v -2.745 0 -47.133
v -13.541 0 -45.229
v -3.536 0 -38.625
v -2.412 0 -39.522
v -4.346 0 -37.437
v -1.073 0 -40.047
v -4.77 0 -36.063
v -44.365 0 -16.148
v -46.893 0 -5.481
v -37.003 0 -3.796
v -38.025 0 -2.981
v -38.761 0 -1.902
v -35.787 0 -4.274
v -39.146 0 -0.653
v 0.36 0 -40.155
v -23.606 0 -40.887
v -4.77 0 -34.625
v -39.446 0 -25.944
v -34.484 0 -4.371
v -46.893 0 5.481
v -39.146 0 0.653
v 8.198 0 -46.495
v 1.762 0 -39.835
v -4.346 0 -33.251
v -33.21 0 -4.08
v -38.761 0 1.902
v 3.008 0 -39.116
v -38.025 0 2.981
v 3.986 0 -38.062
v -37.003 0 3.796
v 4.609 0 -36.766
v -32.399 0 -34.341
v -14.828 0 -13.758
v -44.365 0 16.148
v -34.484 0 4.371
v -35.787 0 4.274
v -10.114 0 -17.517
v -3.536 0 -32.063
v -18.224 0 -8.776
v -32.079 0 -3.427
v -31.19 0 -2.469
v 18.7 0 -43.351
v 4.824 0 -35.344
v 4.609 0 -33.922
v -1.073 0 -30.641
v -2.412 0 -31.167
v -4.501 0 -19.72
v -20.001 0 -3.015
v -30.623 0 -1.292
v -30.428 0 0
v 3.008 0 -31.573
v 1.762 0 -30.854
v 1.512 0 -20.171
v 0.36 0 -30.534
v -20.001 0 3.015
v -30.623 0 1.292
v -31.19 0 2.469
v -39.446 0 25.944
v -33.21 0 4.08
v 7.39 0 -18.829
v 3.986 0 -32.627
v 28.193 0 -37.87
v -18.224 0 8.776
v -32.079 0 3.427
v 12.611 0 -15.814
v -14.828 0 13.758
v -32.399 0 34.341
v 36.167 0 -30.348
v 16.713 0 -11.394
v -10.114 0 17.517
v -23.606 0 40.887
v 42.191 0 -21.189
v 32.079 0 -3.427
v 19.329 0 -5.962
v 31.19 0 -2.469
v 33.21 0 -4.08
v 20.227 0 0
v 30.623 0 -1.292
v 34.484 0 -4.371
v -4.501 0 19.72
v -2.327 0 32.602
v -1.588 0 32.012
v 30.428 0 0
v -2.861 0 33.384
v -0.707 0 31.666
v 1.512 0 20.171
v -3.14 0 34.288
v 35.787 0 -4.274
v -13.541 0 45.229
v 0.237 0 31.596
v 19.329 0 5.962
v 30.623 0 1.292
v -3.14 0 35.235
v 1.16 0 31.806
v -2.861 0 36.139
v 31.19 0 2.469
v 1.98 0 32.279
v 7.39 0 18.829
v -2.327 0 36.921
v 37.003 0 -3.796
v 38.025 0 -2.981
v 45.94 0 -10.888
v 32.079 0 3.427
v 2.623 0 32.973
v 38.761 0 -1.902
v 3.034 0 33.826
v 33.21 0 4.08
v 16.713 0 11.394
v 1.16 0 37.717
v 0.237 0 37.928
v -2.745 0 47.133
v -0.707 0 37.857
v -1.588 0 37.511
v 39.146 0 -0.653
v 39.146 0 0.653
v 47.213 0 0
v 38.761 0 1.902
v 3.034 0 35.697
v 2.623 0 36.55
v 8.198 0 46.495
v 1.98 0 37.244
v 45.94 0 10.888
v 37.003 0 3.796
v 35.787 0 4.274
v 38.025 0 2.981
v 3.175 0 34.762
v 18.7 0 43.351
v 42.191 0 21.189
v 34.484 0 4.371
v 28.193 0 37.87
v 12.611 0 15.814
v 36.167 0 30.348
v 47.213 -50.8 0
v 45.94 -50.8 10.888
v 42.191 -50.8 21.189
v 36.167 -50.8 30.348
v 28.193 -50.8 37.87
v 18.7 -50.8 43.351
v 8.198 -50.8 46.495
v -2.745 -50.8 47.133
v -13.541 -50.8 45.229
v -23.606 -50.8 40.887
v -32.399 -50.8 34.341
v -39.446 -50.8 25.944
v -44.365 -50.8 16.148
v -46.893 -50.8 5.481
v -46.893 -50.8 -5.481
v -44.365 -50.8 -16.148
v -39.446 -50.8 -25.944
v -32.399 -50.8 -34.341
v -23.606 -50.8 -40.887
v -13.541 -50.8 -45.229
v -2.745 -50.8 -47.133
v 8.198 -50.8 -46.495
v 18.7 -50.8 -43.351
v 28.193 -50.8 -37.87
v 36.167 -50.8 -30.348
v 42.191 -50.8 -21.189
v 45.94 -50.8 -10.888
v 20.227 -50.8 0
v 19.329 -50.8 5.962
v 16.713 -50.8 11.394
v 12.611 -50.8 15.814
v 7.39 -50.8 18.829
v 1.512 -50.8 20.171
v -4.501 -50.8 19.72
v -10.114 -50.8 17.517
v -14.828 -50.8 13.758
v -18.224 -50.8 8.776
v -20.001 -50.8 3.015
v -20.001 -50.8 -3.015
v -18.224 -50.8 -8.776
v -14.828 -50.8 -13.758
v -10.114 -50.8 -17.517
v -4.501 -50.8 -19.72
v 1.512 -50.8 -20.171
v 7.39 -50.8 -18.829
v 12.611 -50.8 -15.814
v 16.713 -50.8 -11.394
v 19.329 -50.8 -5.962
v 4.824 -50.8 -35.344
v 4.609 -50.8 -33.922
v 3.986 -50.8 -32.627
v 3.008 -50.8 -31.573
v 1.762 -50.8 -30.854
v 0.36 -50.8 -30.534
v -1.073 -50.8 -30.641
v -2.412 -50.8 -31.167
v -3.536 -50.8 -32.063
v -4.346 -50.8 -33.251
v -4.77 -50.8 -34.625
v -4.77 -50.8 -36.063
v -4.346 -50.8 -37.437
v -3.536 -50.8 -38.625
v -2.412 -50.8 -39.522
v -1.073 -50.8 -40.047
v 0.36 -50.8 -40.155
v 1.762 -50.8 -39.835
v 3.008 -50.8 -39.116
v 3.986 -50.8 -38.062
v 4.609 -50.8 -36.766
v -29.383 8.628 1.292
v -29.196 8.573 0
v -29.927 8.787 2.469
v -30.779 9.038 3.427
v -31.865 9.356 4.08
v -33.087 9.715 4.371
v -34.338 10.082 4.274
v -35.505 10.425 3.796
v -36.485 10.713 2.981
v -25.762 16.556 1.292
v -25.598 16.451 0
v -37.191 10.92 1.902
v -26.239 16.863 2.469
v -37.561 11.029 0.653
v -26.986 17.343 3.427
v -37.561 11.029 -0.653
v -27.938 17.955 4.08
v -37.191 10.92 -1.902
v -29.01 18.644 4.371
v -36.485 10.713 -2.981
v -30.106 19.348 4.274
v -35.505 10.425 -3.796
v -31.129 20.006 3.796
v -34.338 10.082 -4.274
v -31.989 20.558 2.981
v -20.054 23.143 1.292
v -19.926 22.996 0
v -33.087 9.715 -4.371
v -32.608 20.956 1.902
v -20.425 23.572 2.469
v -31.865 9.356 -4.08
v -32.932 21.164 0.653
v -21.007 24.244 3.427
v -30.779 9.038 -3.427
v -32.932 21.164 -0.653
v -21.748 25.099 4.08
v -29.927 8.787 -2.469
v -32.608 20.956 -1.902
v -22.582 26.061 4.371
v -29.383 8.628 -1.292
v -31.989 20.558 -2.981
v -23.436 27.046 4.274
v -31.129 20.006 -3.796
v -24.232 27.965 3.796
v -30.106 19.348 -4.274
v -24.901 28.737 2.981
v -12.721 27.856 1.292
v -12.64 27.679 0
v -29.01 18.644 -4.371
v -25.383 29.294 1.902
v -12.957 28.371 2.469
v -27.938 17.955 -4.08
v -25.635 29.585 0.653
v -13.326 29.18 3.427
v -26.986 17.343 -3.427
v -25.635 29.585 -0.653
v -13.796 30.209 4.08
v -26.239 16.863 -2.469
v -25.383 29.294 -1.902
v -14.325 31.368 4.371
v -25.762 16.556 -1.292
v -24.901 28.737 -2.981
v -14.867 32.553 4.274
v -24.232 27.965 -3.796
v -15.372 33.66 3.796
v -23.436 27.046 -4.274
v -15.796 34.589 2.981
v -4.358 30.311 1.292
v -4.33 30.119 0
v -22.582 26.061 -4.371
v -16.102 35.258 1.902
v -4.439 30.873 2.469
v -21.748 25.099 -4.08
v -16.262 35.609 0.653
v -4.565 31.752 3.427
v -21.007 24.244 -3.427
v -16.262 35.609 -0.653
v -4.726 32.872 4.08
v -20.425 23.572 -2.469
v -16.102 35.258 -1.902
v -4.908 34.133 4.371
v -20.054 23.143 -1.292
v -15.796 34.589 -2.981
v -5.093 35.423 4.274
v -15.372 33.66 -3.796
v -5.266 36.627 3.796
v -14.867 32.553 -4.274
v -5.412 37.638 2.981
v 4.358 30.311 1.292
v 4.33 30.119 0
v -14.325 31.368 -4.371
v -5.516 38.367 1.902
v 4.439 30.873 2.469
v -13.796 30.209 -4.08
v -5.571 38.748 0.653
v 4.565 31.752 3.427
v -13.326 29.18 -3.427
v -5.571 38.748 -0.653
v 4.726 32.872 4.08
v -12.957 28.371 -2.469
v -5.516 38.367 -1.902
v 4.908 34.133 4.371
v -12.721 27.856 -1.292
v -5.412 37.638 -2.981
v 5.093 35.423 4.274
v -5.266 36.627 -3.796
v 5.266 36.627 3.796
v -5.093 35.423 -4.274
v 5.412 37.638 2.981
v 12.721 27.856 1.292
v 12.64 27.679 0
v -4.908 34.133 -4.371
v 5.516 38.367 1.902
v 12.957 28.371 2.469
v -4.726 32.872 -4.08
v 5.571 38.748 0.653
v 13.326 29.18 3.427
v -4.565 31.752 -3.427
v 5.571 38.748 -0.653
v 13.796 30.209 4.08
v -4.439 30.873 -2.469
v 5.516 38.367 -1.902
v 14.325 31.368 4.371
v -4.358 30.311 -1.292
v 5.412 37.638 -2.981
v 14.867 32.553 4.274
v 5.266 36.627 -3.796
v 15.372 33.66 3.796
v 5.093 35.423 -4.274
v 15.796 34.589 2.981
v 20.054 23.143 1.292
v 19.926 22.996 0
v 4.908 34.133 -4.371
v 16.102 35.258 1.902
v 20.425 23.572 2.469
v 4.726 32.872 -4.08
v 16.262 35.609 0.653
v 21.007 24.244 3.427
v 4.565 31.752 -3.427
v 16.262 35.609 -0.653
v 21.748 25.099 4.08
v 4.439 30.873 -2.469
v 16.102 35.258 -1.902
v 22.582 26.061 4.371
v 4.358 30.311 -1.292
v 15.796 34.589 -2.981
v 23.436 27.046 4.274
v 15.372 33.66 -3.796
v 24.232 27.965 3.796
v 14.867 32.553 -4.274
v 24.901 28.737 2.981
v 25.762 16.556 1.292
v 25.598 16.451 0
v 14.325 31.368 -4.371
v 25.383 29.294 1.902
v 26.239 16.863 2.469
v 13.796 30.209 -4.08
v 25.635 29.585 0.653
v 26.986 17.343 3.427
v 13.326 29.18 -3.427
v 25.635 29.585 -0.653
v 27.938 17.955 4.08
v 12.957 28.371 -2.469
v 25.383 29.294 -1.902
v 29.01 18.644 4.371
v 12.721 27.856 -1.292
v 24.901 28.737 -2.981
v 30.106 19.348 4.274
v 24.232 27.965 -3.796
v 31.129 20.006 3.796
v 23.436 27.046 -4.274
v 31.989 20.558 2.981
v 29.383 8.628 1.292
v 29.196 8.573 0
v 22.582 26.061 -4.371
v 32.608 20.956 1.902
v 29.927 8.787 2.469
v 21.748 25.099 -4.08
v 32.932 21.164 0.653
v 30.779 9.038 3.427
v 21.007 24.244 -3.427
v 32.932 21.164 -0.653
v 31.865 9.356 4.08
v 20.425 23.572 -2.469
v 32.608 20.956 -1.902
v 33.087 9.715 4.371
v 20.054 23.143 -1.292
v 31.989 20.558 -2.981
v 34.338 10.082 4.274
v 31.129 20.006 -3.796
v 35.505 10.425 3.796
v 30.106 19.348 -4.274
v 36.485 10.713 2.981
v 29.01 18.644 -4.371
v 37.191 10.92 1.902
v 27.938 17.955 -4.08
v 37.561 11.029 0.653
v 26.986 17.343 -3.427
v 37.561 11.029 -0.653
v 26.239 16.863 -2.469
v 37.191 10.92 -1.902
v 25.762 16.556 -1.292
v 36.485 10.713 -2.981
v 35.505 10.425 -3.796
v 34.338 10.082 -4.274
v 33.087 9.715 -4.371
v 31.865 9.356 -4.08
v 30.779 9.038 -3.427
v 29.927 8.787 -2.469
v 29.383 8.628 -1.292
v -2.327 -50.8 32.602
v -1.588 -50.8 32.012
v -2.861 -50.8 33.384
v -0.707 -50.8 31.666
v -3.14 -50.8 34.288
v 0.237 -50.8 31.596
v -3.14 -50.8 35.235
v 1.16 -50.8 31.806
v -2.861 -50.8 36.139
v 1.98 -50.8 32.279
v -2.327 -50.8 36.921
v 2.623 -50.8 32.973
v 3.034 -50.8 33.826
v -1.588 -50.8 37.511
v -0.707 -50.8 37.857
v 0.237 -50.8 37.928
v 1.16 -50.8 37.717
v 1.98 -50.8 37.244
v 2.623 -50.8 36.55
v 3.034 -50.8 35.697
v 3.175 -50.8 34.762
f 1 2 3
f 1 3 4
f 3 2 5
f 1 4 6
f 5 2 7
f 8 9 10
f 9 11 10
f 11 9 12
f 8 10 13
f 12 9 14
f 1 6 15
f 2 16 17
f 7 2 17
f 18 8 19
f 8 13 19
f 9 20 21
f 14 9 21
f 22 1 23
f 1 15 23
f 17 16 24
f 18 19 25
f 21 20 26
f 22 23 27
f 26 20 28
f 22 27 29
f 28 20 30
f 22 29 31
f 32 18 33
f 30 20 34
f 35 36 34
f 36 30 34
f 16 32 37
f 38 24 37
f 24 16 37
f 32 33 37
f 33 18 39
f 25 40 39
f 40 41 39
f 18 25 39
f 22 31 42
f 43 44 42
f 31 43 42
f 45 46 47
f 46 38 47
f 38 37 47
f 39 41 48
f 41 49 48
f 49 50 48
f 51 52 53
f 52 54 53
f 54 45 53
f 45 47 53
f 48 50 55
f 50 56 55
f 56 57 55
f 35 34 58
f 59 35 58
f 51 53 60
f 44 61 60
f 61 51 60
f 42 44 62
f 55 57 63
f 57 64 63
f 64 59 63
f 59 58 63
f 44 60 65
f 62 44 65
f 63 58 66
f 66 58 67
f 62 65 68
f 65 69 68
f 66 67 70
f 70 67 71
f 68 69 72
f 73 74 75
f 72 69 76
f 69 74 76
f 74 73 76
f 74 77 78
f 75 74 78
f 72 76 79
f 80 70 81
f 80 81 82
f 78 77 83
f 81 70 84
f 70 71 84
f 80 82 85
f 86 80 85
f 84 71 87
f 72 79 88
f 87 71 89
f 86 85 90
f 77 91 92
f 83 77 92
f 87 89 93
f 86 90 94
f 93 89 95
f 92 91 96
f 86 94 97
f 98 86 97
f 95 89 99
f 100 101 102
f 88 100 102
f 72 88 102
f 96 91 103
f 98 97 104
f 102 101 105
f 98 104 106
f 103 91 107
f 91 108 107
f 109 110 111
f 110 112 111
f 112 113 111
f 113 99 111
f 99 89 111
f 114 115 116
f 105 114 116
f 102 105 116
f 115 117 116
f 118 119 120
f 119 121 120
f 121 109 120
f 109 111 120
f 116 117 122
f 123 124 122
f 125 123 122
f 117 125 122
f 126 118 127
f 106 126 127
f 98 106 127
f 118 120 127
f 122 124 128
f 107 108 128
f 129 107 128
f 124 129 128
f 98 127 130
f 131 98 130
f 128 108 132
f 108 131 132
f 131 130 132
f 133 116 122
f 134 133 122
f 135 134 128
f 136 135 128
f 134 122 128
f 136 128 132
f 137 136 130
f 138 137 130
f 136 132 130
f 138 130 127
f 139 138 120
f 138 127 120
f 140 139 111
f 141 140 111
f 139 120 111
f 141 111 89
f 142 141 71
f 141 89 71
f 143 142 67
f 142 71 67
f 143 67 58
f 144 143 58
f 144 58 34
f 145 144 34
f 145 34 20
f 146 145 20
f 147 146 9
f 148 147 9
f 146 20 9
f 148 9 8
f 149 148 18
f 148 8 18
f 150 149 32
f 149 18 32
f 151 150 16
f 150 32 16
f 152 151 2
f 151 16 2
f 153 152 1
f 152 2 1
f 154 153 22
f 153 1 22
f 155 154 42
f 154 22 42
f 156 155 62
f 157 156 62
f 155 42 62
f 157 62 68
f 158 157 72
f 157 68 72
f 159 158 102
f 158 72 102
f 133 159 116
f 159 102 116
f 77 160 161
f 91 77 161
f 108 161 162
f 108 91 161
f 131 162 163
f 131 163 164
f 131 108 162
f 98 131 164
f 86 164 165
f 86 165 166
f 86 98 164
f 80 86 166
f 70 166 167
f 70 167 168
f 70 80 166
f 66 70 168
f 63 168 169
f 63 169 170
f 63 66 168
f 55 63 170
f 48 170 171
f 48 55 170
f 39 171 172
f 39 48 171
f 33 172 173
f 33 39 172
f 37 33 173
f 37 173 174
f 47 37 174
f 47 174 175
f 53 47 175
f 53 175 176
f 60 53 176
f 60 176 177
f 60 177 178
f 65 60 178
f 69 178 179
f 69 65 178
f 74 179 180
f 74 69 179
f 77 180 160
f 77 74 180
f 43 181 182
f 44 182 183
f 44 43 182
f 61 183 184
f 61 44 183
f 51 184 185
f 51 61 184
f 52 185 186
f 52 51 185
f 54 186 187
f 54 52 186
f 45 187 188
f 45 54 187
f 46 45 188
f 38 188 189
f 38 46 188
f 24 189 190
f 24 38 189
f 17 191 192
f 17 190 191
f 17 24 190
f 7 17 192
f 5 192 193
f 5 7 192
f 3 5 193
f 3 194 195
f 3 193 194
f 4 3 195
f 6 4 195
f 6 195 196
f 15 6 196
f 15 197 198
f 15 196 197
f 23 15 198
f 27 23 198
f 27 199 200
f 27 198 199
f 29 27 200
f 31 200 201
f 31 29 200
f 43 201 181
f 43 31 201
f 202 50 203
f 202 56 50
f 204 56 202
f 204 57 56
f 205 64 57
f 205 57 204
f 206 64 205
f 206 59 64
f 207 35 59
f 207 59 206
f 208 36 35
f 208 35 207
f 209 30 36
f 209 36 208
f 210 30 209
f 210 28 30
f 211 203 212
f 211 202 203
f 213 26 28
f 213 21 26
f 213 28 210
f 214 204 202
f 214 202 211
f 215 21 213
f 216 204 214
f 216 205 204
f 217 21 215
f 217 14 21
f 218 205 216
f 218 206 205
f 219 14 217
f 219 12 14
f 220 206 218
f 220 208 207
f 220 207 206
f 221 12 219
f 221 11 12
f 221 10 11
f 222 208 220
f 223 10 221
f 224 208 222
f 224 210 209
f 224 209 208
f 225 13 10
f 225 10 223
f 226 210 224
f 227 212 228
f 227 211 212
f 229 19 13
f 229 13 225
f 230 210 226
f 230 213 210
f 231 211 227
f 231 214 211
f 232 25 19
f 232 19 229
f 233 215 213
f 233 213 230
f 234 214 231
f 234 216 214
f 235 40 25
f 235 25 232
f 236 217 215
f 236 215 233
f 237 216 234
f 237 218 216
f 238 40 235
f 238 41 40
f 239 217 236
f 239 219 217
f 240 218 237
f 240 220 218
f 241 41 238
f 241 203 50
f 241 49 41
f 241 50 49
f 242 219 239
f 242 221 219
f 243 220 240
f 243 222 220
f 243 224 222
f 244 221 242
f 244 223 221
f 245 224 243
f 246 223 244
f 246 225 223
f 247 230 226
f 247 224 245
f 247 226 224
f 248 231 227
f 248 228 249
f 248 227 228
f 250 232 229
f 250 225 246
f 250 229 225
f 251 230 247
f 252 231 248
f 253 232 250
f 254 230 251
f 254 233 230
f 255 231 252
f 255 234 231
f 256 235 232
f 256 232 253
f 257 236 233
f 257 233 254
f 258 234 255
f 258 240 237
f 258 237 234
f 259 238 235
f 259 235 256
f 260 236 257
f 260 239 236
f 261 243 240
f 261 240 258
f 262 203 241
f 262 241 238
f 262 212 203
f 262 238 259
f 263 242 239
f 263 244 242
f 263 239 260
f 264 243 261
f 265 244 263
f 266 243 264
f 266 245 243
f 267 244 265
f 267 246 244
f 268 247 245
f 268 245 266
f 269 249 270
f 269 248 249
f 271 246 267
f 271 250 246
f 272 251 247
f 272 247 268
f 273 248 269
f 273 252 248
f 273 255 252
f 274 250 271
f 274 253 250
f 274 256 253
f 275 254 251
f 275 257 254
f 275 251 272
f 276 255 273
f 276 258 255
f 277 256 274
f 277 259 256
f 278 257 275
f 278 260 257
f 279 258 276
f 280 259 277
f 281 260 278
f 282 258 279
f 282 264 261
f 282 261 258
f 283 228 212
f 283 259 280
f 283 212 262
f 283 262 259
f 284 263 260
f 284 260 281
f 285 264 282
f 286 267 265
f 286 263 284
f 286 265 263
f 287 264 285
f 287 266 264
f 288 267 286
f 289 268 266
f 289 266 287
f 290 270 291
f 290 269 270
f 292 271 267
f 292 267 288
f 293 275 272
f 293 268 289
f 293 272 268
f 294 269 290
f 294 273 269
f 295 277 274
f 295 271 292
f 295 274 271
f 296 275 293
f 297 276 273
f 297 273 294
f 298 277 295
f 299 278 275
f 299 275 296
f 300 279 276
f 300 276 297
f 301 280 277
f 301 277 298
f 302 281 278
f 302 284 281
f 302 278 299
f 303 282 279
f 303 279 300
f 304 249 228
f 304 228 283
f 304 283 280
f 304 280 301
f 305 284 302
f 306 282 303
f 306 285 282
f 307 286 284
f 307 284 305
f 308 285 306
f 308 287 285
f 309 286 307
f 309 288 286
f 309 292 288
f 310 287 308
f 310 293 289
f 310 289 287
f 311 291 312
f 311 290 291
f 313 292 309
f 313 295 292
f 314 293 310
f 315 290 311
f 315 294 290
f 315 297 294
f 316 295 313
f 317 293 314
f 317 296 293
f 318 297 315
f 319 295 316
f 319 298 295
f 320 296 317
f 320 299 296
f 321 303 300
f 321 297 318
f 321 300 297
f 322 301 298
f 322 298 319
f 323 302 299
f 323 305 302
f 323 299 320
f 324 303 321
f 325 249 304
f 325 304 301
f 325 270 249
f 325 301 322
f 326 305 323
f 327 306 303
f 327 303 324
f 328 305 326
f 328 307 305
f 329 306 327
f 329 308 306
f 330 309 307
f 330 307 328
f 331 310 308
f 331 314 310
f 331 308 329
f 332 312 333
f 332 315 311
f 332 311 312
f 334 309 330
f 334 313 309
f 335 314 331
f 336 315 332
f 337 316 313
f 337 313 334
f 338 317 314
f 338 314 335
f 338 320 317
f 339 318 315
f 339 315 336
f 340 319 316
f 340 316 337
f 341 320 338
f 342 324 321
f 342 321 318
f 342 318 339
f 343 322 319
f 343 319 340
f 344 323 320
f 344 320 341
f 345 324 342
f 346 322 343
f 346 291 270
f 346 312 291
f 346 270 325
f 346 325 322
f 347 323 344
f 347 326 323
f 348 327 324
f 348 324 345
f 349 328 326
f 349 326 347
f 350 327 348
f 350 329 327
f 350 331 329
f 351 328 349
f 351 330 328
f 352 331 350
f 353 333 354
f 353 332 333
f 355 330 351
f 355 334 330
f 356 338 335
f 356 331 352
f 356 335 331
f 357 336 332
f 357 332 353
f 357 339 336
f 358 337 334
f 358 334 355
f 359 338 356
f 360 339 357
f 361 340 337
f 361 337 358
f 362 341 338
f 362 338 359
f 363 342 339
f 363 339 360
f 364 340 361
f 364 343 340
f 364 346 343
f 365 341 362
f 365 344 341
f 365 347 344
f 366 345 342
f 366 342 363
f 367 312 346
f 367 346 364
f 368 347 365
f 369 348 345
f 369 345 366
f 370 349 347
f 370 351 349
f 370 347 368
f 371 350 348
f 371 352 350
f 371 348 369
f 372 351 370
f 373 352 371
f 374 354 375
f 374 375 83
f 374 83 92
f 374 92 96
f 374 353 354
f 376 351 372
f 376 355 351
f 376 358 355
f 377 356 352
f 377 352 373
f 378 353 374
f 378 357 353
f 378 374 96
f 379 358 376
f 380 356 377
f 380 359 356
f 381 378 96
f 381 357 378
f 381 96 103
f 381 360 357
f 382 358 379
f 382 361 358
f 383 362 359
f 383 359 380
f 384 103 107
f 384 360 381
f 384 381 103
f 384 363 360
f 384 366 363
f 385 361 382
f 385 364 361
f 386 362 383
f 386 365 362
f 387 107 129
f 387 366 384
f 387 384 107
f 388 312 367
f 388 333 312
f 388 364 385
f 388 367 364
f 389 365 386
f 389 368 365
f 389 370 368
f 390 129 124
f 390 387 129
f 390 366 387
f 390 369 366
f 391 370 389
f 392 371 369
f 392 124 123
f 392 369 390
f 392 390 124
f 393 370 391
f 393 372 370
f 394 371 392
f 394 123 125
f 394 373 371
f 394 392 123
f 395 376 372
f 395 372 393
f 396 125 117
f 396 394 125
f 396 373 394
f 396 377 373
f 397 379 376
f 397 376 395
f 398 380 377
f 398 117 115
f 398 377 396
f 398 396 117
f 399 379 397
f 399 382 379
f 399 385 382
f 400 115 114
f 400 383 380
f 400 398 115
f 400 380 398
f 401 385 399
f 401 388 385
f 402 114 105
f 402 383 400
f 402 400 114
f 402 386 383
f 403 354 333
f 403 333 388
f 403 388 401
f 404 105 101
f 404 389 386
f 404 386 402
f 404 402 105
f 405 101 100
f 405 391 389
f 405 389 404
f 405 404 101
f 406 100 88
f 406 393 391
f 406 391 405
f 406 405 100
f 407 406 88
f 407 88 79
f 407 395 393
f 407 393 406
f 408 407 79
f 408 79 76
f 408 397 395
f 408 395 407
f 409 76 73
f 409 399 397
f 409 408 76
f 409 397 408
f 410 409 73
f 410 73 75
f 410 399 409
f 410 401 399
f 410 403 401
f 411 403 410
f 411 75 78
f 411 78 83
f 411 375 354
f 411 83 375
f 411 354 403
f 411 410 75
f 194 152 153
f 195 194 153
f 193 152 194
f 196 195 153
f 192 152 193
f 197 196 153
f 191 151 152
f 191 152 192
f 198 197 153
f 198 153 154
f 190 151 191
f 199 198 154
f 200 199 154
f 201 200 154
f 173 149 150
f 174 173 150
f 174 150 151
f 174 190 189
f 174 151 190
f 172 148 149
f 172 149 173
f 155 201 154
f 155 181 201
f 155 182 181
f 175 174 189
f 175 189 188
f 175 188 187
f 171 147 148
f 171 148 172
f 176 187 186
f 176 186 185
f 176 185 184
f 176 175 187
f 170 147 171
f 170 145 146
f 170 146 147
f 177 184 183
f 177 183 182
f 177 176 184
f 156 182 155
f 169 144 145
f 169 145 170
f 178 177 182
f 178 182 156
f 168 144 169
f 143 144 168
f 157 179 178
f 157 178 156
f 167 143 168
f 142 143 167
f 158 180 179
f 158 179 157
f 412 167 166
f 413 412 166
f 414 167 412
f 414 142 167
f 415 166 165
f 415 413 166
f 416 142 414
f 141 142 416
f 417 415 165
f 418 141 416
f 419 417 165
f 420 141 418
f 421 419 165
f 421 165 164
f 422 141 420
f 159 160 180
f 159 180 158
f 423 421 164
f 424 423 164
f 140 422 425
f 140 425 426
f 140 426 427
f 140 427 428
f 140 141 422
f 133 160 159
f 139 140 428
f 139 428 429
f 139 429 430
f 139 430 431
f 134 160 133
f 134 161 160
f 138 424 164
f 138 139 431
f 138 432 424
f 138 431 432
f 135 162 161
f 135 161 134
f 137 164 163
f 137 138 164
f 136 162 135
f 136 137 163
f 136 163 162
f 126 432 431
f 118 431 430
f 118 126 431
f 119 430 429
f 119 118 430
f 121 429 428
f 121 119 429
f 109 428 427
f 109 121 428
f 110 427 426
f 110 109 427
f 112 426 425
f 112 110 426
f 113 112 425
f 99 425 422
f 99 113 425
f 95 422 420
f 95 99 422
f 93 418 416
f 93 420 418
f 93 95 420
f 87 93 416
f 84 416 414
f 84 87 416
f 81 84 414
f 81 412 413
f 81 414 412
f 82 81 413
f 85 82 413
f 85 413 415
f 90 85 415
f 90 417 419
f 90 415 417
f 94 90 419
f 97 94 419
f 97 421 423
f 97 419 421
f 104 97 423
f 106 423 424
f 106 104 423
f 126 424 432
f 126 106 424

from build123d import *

# Parameters (mm, degrees)
F0_R     = 47.2126506678
F0_R_2   = 20.2272154061
F1_DEPTH = 50.8
F2_R     = 3.175
F2_R_2   = 4.8238037601
F3_DEPTH = 50.801
F4_R     = 4.3834323194
F5_ANGLE = 180


# Not quite as in the source:
# - the program builds the solid bodies; features that only make, move or delete a surface that nothing else refers to are left out


with BuildPart() as f1:
    # F0 (on Front) → F1 (new body)
    with BuildSketch(Plane.XZ):
        Circle(F0_R)
        Circle(F0_R_2, mode=Mode.SUBTRACT)
    extrude(amount=F1_DEPTH)

    # F2 (on Front) → F3 (cut, through all)
    with BuildSketch(Plane.XZ):
        with Locations((0, 34.7616262734)):
            Circle(F2_R)
        with Locations((0, -35.3442244232)):
            Circle(F2_R_2)
    extrude(amount=F3_DEPTH, mode=Mode.SUBTRACT)

    # F4 (on Front) → F5 (revolve)
    with BuildSketch(Plane.XZ):
        with Locations((-34.811783582, 0)):
            Circle(F4_R)
    revolve(axis=Axis((0, 0, 1.5608235262), (0, 0, -1)), revolution_arc=F5_ANGLE)


solid = f1.part
